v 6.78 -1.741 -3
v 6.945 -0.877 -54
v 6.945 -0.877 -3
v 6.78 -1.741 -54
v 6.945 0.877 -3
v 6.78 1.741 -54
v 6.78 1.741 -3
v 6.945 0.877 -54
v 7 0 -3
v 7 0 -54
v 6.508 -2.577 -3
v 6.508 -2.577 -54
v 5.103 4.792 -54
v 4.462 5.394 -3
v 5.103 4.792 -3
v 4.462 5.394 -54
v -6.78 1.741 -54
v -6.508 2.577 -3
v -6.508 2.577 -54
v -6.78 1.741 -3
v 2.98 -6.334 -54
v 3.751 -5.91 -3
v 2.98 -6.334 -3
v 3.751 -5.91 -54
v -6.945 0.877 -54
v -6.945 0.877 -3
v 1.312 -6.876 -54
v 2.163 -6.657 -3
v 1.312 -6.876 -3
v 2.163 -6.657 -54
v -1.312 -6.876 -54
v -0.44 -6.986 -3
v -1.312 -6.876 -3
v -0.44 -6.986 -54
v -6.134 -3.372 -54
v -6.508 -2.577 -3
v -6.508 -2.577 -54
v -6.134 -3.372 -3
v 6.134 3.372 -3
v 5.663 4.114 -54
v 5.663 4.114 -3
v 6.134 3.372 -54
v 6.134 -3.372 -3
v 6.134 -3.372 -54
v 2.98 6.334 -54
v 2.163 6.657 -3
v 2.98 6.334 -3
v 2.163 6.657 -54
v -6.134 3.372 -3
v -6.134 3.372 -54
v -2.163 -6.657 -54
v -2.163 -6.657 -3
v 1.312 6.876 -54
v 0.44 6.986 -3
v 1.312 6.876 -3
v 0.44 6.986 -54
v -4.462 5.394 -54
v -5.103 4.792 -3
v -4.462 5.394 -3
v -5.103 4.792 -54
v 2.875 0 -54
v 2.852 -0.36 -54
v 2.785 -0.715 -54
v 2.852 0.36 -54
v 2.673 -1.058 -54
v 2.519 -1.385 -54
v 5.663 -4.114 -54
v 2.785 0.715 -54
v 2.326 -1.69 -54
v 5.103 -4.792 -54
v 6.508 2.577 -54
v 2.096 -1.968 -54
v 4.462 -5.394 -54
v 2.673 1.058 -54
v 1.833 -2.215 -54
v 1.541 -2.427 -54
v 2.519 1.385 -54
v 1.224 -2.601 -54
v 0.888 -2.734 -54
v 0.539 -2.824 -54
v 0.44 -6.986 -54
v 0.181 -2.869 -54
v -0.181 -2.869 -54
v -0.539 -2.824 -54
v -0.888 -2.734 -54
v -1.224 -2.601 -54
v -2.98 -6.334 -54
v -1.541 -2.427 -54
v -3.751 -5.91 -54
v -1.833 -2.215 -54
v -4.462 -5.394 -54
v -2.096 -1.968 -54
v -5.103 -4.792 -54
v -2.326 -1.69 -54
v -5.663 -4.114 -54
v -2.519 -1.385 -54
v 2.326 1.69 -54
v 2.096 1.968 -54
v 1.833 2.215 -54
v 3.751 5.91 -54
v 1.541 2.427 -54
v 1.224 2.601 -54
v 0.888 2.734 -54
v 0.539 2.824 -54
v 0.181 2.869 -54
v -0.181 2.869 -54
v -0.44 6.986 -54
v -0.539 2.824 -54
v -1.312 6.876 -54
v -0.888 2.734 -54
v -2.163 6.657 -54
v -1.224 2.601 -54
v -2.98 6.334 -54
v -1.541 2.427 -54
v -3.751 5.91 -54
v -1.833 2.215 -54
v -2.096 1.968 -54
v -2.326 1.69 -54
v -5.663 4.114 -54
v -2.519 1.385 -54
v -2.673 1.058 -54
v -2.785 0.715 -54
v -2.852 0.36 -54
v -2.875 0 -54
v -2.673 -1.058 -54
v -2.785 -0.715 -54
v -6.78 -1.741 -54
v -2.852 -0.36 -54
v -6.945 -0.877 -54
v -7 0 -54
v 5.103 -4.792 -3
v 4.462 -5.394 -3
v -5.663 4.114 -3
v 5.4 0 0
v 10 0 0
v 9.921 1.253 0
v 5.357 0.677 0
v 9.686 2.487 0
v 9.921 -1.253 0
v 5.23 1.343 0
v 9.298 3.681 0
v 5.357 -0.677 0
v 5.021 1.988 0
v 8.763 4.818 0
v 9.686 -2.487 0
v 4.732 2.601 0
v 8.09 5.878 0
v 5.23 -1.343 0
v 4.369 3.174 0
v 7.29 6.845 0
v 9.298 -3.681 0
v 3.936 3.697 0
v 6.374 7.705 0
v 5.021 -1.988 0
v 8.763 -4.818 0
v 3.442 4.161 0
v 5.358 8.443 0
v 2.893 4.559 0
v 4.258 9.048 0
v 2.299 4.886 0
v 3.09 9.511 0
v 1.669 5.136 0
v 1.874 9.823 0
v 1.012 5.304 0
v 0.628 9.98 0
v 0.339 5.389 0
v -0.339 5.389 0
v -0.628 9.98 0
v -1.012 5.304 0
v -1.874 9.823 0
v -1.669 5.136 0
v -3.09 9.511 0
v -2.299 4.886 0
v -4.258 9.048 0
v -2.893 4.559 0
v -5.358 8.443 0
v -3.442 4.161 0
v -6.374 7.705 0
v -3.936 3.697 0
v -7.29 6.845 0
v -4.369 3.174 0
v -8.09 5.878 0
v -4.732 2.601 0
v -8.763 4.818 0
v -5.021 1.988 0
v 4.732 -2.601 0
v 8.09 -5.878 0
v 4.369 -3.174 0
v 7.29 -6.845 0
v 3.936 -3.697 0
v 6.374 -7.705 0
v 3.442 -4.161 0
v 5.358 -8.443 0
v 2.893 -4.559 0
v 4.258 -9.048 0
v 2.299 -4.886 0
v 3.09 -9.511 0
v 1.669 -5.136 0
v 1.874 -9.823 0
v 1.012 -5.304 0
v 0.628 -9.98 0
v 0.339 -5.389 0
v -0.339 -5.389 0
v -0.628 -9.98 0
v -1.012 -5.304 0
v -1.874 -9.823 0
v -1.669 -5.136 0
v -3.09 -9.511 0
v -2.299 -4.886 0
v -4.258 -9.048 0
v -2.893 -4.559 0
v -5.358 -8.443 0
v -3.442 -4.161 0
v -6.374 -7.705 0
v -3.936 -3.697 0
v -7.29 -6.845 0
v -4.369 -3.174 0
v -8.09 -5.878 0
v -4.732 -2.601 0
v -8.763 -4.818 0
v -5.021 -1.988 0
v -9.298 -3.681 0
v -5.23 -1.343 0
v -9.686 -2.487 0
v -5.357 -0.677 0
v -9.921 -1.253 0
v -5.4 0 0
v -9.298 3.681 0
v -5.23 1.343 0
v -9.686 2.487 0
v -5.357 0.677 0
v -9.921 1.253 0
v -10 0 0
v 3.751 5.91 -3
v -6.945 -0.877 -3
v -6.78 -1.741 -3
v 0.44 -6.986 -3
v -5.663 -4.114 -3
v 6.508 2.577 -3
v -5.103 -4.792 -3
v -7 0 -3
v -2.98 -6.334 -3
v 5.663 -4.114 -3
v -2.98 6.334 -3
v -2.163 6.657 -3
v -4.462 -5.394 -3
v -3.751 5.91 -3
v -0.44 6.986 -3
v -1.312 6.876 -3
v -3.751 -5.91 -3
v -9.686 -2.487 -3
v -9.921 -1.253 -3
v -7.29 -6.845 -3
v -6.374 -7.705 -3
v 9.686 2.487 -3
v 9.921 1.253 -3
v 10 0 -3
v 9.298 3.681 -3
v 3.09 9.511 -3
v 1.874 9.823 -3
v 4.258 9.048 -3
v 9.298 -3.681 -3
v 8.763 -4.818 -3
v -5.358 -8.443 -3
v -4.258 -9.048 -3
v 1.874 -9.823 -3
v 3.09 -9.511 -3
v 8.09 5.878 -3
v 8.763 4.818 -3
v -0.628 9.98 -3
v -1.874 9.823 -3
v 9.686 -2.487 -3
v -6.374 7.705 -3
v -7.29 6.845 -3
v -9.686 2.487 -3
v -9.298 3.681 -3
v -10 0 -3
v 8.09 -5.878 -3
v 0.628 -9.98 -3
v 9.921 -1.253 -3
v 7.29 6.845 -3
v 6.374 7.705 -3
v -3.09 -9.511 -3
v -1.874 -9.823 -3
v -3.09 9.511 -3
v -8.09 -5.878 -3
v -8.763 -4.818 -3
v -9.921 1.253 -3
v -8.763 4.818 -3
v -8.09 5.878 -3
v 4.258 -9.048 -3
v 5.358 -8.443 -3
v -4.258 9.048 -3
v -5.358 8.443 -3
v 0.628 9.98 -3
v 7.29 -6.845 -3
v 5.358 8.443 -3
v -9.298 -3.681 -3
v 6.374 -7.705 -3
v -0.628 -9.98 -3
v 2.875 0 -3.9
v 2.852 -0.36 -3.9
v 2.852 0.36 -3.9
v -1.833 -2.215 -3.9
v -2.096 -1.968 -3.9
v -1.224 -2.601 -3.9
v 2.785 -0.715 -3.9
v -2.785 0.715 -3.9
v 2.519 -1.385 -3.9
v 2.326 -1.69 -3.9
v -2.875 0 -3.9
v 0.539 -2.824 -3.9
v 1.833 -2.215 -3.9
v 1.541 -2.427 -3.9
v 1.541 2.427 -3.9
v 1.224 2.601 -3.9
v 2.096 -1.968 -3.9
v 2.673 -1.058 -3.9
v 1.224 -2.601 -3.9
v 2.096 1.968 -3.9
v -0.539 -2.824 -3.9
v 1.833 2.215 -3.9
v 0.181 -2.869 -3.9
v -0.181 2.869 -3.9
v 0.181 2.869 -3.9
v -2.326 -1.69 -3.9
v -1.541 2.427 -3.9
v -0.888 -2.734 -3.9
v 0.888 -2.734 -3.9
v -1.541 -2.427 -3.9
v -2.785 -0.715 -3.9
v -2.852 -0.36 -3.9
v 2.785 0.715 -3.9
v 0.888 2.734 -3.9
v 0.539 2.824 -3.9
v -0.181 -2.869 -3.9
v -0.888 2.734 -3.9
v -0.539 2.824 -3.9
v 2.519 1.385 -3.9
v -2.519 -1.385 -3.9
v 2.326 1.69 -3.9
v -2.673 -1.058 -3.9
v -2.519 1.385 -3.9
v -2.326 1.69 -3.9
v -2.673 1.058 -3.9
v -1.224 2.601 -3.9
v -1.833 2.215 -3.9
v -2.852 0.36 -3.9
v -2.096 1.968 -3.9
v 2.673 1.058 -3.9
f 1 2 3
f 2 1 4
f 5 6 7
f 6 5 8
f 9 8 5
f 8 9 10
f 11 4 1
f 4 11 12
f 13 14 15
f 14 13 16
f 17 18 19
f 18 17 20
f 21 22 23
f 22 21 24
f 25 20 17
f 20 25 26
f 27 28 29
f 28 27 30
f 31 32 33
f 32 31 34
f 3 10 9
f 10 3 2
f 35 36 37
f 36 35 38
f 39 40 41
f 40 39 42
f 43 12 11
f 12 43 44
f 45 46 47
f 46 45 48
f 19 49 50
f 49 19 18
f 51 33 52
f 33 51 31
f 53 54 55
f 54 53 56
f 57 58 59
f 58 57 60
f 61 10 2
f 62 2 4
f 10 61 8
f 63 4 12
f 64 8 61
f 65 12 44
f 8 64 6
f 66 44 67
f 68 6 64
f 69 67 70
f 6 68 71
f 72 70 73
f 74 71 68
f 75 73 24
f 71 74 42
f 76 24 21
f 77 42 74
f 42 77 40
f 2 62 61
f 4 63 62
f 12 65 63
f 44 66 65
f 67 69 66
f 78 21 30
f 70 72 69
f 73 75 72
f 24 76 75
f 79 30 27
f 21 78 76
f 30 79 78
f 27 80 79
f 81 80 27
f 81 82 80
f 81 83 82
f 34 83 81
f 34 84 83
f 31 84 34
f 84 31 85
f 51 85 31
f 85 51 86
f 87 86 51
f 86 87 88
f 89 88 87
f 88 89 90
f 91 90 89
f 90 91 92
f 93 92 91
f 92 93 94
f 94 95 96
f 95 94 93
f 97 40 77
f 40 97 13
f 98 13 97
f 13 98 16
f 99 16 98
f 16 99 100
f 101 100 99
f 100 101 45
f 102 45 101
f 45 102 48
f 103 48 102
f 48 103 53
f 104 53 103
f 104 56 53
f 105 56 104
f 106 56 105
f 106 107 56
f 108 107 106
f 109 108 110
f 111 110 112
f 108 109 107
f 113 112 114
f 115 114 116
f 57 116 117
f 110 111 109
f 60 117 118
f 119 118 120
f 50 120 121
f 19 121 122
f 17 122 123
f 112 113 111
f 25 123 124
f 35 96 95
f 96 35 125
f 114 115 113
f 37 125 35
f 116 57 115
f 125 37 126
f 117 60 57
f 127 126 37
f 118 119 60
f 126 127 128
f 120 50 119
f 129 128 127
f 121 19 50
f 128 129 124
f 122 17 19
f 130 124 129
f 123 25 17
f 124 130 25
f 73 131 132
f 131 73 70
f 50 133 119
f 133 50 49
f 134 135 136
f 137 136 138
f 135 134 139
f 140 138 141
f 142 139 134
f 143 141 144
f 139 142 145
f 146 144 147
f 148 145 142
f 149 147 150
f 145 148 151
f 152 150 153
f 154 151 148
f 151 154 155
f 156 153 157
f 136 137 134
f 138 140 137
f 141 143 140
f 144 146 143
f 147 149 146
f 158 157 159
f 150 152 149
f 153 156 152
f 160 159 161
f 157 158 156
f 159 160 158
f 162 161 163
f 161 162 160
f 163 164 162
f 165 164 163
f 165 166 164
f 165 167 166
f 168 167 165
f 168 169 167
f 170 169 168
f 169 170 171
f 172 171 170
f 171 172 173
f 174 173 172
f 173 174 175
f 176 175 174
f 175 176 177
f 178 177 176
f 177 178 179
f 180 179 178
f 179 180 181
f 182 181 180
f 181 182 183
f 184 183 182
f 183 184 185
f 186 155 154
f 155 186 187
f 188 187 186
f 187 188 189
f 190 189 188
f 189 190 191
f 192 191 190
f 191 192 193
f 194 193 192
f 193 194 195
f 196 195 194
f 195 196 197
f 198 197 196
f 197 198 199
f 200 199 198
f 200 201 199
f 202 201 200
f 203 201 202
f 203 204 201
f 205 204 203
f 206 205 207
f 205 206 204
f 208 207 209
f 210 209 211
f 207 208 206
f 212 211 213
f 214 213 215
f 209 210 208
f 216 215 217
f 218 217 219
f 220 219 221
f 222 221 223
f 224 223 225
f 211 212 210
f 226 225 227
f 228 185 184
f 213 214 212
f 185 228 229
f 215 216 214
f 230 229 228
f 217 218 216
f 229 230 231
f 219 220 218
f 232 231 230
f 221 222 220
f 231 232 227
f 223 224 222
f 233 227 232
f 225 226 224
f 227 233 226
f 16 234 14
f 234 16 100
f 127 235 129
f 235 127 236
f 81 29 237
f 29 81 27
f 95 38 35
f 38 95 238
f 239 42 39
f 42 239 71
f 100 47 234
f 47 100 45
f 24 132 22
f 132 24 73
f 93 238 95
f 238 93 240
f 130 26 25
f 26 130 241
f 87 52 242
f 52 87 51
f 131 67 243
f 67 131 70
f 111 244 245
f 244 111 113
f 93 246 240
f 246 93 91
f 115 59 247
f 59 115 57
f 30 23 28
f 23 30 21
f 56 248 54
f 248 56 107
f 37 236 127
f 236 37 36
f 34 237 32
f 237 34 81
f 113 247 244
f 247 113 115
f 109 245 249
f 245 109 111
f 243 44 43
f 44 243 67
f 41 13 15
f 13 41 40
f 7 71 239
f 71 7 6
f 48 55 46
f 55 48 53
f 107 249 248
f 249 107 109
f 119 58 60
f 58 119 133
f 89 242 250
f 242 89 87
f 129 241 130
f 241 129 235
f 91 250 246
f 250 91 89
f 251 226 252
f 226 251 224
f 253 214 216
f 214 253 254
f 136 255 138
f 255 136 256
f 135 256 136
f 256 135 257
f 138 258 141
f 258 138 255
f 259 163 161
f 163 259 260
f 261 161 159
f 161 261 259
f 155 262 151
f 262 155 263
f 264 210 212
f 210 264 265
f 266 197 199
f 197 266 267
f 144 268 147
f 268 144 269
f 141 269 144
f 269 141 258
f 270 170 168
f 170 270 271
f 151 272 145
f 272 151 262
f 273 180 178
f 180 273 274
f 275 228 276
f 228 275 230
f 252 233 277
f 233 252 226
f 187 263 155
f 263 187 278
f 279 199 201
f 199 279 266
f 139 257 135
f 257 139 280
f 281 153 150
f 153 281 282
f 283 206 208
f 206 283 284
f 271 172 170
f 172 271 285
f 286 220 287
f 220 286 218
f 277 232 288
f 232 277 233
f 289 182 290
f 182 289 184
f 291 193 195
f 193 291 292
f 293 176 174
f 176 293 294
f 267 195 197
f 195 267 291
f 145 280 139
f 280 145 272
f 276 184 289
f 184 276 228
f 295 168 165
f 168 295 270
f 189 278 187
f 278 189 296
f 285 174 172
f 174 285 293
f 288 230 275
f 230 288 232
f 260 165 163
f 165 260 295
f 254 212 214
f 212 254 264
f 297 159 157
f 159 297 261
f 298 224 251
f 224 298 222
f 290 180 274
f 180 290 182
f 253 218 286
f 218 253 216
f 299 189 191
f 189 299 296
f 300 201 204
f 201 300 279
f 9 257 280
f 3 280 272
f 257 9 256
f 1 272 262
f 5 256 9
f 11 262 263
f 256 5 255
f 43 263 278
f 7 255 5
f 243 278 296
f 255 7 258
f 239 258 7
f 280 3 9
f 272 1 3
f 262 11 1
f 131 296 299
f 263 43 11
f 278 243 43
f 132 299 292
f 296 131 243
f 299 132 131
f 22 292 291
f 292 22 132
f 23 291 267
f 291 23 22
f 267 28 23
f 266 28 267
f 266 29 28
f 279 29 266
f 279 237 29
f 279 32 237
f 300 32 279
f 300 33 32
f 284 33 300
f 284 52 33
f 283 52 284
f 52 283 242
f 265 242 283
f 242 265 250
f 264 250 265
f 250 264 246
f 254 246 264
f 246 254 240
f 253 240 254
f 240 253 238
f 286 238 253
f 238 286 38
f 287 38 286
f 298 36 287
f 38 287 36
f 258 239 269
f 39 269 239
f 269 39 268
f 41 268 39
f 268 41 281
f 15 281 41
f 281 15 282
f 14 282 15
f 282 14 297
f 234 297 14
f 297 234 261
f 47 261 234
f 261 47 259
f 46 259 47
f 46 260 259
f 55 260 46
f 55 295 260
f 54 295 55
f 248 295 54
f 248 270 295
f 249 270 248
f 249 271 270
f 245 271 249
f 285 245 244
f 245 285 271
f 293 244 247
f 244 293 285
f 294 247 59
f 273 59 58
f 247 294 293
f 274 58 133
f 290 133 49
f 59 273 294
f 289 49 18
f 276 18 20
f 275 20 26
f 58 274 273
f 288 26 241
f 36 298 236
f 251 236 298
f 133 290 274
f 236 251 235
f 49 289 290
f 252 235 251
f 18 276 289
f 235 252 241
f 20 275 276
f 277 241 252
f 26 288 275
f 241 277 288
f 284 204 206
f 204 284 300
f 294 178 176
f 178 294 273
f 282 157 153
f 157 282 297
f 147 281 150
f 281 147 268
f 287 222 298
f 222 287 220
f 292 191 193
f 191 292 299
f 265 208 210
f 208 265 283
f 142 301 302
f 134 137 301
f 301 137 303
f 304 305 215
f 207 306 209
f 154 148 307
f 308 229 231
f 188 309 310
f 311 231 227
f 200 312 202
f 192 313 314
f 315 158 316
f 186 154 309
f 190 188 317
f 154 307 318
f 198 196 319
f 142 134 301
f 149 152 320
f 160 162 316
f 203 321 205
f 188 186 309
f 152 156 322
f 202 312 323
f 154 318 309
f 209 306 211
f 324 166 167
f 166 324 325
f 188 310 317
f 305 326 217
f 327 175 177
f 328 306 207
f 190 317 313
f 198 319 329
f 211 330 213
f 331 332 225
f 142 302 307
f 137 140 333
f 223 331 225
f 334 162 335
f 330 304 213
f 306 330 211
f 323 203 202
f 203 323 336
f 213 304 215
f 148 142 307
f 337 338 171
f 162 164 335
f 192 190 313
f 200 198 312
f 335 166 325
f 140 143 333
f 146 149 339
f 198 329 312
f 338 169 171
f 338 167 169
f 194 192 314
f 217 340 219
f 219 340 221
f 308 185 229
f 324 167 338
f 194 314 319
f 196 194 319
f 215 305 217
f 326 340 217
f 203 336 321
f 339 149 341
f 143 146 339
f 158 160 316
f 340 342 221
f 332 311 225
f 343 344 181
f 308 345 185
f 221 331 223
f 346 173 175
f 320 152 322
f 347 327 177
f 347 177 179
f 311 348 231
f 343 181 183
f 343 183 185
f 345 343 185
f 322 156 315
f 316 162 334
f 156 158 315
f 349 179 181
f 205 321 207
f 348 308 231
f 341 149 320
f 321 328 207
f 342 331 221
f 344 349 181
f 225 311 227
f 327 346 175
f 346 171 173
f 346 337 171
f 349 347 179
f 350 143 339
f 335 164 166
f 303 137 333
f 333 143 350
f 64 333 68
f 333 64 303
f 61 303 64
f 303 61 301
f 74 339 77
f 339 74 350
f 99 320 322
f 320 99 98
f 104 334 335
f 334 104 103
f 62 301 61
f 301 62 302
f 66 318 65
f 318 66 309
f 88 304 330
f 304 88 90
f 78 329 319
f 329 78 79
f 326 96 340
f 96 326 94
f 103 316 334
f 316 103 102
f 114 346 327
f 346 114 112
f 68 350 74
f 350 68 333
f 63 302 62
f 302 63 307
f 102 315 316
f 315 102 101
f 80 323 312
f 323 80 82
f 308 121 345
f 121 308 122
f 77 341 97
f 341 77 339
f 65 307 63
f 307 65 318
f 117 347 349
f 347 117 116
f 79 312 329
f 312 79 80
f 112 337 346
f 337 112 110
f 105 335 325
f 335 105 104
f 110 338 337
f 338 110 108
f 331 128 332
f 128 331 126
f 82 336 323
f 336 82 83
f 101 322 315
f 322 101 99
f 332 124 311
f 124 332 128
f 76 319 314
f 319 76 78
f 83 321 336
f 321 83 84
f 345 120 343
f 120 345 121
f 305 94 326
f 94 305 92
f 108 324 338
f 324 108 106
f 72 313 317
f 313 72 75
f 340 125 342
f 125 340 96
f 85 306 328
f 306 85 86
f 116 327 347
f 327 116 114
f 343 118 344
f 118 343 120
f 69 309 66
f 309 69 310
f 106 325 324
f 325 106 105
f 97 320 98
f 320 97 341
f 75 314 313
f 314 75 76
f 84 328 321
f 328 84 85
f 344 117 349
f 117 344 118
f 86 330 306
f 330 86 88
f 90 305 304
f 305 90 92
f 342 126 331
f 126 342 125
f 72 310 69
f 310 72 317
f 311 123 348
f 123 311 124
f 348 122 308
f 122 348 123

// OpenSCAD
$fn = 50;


difference() {
	union() {
		translate(v = [0, 0, -54.0000000000]) {
			cylinder(h = 54, r = 7.0000000000);
		}
		translate(v = [0, 0, -3.0000000000]) {
			cylinder(h = 3, r = 10.0000000000);
		}
	}
	union() {
		translate(v = [0, 0, 0]) {
			rotate(a = [0, 0, 0]) {
				difference() {
					union() {
						#translate(v = [0, 0, -54.0000000000]) {
							cylinder(h = 54, r = 2.6000000000);
						}
						#translate(v = [0, 0, -3.9000000000]) {
							cylinder(h = 3.9000000000, r = 7.0000000000, r1 = 2.8750000000, r2 = 5.4000000000);
						}
						#translate(v = [0, 0, -54.0000000000]) {
							cylinder(h = 54, r = 2.8750000000);
						}
						#translate(v = [0, 0, -54.0000000000]) {
							cylinder(h = 54, r = 2.6000000000);
						}
					}
					union();
				}
			}
		}
	}
}
